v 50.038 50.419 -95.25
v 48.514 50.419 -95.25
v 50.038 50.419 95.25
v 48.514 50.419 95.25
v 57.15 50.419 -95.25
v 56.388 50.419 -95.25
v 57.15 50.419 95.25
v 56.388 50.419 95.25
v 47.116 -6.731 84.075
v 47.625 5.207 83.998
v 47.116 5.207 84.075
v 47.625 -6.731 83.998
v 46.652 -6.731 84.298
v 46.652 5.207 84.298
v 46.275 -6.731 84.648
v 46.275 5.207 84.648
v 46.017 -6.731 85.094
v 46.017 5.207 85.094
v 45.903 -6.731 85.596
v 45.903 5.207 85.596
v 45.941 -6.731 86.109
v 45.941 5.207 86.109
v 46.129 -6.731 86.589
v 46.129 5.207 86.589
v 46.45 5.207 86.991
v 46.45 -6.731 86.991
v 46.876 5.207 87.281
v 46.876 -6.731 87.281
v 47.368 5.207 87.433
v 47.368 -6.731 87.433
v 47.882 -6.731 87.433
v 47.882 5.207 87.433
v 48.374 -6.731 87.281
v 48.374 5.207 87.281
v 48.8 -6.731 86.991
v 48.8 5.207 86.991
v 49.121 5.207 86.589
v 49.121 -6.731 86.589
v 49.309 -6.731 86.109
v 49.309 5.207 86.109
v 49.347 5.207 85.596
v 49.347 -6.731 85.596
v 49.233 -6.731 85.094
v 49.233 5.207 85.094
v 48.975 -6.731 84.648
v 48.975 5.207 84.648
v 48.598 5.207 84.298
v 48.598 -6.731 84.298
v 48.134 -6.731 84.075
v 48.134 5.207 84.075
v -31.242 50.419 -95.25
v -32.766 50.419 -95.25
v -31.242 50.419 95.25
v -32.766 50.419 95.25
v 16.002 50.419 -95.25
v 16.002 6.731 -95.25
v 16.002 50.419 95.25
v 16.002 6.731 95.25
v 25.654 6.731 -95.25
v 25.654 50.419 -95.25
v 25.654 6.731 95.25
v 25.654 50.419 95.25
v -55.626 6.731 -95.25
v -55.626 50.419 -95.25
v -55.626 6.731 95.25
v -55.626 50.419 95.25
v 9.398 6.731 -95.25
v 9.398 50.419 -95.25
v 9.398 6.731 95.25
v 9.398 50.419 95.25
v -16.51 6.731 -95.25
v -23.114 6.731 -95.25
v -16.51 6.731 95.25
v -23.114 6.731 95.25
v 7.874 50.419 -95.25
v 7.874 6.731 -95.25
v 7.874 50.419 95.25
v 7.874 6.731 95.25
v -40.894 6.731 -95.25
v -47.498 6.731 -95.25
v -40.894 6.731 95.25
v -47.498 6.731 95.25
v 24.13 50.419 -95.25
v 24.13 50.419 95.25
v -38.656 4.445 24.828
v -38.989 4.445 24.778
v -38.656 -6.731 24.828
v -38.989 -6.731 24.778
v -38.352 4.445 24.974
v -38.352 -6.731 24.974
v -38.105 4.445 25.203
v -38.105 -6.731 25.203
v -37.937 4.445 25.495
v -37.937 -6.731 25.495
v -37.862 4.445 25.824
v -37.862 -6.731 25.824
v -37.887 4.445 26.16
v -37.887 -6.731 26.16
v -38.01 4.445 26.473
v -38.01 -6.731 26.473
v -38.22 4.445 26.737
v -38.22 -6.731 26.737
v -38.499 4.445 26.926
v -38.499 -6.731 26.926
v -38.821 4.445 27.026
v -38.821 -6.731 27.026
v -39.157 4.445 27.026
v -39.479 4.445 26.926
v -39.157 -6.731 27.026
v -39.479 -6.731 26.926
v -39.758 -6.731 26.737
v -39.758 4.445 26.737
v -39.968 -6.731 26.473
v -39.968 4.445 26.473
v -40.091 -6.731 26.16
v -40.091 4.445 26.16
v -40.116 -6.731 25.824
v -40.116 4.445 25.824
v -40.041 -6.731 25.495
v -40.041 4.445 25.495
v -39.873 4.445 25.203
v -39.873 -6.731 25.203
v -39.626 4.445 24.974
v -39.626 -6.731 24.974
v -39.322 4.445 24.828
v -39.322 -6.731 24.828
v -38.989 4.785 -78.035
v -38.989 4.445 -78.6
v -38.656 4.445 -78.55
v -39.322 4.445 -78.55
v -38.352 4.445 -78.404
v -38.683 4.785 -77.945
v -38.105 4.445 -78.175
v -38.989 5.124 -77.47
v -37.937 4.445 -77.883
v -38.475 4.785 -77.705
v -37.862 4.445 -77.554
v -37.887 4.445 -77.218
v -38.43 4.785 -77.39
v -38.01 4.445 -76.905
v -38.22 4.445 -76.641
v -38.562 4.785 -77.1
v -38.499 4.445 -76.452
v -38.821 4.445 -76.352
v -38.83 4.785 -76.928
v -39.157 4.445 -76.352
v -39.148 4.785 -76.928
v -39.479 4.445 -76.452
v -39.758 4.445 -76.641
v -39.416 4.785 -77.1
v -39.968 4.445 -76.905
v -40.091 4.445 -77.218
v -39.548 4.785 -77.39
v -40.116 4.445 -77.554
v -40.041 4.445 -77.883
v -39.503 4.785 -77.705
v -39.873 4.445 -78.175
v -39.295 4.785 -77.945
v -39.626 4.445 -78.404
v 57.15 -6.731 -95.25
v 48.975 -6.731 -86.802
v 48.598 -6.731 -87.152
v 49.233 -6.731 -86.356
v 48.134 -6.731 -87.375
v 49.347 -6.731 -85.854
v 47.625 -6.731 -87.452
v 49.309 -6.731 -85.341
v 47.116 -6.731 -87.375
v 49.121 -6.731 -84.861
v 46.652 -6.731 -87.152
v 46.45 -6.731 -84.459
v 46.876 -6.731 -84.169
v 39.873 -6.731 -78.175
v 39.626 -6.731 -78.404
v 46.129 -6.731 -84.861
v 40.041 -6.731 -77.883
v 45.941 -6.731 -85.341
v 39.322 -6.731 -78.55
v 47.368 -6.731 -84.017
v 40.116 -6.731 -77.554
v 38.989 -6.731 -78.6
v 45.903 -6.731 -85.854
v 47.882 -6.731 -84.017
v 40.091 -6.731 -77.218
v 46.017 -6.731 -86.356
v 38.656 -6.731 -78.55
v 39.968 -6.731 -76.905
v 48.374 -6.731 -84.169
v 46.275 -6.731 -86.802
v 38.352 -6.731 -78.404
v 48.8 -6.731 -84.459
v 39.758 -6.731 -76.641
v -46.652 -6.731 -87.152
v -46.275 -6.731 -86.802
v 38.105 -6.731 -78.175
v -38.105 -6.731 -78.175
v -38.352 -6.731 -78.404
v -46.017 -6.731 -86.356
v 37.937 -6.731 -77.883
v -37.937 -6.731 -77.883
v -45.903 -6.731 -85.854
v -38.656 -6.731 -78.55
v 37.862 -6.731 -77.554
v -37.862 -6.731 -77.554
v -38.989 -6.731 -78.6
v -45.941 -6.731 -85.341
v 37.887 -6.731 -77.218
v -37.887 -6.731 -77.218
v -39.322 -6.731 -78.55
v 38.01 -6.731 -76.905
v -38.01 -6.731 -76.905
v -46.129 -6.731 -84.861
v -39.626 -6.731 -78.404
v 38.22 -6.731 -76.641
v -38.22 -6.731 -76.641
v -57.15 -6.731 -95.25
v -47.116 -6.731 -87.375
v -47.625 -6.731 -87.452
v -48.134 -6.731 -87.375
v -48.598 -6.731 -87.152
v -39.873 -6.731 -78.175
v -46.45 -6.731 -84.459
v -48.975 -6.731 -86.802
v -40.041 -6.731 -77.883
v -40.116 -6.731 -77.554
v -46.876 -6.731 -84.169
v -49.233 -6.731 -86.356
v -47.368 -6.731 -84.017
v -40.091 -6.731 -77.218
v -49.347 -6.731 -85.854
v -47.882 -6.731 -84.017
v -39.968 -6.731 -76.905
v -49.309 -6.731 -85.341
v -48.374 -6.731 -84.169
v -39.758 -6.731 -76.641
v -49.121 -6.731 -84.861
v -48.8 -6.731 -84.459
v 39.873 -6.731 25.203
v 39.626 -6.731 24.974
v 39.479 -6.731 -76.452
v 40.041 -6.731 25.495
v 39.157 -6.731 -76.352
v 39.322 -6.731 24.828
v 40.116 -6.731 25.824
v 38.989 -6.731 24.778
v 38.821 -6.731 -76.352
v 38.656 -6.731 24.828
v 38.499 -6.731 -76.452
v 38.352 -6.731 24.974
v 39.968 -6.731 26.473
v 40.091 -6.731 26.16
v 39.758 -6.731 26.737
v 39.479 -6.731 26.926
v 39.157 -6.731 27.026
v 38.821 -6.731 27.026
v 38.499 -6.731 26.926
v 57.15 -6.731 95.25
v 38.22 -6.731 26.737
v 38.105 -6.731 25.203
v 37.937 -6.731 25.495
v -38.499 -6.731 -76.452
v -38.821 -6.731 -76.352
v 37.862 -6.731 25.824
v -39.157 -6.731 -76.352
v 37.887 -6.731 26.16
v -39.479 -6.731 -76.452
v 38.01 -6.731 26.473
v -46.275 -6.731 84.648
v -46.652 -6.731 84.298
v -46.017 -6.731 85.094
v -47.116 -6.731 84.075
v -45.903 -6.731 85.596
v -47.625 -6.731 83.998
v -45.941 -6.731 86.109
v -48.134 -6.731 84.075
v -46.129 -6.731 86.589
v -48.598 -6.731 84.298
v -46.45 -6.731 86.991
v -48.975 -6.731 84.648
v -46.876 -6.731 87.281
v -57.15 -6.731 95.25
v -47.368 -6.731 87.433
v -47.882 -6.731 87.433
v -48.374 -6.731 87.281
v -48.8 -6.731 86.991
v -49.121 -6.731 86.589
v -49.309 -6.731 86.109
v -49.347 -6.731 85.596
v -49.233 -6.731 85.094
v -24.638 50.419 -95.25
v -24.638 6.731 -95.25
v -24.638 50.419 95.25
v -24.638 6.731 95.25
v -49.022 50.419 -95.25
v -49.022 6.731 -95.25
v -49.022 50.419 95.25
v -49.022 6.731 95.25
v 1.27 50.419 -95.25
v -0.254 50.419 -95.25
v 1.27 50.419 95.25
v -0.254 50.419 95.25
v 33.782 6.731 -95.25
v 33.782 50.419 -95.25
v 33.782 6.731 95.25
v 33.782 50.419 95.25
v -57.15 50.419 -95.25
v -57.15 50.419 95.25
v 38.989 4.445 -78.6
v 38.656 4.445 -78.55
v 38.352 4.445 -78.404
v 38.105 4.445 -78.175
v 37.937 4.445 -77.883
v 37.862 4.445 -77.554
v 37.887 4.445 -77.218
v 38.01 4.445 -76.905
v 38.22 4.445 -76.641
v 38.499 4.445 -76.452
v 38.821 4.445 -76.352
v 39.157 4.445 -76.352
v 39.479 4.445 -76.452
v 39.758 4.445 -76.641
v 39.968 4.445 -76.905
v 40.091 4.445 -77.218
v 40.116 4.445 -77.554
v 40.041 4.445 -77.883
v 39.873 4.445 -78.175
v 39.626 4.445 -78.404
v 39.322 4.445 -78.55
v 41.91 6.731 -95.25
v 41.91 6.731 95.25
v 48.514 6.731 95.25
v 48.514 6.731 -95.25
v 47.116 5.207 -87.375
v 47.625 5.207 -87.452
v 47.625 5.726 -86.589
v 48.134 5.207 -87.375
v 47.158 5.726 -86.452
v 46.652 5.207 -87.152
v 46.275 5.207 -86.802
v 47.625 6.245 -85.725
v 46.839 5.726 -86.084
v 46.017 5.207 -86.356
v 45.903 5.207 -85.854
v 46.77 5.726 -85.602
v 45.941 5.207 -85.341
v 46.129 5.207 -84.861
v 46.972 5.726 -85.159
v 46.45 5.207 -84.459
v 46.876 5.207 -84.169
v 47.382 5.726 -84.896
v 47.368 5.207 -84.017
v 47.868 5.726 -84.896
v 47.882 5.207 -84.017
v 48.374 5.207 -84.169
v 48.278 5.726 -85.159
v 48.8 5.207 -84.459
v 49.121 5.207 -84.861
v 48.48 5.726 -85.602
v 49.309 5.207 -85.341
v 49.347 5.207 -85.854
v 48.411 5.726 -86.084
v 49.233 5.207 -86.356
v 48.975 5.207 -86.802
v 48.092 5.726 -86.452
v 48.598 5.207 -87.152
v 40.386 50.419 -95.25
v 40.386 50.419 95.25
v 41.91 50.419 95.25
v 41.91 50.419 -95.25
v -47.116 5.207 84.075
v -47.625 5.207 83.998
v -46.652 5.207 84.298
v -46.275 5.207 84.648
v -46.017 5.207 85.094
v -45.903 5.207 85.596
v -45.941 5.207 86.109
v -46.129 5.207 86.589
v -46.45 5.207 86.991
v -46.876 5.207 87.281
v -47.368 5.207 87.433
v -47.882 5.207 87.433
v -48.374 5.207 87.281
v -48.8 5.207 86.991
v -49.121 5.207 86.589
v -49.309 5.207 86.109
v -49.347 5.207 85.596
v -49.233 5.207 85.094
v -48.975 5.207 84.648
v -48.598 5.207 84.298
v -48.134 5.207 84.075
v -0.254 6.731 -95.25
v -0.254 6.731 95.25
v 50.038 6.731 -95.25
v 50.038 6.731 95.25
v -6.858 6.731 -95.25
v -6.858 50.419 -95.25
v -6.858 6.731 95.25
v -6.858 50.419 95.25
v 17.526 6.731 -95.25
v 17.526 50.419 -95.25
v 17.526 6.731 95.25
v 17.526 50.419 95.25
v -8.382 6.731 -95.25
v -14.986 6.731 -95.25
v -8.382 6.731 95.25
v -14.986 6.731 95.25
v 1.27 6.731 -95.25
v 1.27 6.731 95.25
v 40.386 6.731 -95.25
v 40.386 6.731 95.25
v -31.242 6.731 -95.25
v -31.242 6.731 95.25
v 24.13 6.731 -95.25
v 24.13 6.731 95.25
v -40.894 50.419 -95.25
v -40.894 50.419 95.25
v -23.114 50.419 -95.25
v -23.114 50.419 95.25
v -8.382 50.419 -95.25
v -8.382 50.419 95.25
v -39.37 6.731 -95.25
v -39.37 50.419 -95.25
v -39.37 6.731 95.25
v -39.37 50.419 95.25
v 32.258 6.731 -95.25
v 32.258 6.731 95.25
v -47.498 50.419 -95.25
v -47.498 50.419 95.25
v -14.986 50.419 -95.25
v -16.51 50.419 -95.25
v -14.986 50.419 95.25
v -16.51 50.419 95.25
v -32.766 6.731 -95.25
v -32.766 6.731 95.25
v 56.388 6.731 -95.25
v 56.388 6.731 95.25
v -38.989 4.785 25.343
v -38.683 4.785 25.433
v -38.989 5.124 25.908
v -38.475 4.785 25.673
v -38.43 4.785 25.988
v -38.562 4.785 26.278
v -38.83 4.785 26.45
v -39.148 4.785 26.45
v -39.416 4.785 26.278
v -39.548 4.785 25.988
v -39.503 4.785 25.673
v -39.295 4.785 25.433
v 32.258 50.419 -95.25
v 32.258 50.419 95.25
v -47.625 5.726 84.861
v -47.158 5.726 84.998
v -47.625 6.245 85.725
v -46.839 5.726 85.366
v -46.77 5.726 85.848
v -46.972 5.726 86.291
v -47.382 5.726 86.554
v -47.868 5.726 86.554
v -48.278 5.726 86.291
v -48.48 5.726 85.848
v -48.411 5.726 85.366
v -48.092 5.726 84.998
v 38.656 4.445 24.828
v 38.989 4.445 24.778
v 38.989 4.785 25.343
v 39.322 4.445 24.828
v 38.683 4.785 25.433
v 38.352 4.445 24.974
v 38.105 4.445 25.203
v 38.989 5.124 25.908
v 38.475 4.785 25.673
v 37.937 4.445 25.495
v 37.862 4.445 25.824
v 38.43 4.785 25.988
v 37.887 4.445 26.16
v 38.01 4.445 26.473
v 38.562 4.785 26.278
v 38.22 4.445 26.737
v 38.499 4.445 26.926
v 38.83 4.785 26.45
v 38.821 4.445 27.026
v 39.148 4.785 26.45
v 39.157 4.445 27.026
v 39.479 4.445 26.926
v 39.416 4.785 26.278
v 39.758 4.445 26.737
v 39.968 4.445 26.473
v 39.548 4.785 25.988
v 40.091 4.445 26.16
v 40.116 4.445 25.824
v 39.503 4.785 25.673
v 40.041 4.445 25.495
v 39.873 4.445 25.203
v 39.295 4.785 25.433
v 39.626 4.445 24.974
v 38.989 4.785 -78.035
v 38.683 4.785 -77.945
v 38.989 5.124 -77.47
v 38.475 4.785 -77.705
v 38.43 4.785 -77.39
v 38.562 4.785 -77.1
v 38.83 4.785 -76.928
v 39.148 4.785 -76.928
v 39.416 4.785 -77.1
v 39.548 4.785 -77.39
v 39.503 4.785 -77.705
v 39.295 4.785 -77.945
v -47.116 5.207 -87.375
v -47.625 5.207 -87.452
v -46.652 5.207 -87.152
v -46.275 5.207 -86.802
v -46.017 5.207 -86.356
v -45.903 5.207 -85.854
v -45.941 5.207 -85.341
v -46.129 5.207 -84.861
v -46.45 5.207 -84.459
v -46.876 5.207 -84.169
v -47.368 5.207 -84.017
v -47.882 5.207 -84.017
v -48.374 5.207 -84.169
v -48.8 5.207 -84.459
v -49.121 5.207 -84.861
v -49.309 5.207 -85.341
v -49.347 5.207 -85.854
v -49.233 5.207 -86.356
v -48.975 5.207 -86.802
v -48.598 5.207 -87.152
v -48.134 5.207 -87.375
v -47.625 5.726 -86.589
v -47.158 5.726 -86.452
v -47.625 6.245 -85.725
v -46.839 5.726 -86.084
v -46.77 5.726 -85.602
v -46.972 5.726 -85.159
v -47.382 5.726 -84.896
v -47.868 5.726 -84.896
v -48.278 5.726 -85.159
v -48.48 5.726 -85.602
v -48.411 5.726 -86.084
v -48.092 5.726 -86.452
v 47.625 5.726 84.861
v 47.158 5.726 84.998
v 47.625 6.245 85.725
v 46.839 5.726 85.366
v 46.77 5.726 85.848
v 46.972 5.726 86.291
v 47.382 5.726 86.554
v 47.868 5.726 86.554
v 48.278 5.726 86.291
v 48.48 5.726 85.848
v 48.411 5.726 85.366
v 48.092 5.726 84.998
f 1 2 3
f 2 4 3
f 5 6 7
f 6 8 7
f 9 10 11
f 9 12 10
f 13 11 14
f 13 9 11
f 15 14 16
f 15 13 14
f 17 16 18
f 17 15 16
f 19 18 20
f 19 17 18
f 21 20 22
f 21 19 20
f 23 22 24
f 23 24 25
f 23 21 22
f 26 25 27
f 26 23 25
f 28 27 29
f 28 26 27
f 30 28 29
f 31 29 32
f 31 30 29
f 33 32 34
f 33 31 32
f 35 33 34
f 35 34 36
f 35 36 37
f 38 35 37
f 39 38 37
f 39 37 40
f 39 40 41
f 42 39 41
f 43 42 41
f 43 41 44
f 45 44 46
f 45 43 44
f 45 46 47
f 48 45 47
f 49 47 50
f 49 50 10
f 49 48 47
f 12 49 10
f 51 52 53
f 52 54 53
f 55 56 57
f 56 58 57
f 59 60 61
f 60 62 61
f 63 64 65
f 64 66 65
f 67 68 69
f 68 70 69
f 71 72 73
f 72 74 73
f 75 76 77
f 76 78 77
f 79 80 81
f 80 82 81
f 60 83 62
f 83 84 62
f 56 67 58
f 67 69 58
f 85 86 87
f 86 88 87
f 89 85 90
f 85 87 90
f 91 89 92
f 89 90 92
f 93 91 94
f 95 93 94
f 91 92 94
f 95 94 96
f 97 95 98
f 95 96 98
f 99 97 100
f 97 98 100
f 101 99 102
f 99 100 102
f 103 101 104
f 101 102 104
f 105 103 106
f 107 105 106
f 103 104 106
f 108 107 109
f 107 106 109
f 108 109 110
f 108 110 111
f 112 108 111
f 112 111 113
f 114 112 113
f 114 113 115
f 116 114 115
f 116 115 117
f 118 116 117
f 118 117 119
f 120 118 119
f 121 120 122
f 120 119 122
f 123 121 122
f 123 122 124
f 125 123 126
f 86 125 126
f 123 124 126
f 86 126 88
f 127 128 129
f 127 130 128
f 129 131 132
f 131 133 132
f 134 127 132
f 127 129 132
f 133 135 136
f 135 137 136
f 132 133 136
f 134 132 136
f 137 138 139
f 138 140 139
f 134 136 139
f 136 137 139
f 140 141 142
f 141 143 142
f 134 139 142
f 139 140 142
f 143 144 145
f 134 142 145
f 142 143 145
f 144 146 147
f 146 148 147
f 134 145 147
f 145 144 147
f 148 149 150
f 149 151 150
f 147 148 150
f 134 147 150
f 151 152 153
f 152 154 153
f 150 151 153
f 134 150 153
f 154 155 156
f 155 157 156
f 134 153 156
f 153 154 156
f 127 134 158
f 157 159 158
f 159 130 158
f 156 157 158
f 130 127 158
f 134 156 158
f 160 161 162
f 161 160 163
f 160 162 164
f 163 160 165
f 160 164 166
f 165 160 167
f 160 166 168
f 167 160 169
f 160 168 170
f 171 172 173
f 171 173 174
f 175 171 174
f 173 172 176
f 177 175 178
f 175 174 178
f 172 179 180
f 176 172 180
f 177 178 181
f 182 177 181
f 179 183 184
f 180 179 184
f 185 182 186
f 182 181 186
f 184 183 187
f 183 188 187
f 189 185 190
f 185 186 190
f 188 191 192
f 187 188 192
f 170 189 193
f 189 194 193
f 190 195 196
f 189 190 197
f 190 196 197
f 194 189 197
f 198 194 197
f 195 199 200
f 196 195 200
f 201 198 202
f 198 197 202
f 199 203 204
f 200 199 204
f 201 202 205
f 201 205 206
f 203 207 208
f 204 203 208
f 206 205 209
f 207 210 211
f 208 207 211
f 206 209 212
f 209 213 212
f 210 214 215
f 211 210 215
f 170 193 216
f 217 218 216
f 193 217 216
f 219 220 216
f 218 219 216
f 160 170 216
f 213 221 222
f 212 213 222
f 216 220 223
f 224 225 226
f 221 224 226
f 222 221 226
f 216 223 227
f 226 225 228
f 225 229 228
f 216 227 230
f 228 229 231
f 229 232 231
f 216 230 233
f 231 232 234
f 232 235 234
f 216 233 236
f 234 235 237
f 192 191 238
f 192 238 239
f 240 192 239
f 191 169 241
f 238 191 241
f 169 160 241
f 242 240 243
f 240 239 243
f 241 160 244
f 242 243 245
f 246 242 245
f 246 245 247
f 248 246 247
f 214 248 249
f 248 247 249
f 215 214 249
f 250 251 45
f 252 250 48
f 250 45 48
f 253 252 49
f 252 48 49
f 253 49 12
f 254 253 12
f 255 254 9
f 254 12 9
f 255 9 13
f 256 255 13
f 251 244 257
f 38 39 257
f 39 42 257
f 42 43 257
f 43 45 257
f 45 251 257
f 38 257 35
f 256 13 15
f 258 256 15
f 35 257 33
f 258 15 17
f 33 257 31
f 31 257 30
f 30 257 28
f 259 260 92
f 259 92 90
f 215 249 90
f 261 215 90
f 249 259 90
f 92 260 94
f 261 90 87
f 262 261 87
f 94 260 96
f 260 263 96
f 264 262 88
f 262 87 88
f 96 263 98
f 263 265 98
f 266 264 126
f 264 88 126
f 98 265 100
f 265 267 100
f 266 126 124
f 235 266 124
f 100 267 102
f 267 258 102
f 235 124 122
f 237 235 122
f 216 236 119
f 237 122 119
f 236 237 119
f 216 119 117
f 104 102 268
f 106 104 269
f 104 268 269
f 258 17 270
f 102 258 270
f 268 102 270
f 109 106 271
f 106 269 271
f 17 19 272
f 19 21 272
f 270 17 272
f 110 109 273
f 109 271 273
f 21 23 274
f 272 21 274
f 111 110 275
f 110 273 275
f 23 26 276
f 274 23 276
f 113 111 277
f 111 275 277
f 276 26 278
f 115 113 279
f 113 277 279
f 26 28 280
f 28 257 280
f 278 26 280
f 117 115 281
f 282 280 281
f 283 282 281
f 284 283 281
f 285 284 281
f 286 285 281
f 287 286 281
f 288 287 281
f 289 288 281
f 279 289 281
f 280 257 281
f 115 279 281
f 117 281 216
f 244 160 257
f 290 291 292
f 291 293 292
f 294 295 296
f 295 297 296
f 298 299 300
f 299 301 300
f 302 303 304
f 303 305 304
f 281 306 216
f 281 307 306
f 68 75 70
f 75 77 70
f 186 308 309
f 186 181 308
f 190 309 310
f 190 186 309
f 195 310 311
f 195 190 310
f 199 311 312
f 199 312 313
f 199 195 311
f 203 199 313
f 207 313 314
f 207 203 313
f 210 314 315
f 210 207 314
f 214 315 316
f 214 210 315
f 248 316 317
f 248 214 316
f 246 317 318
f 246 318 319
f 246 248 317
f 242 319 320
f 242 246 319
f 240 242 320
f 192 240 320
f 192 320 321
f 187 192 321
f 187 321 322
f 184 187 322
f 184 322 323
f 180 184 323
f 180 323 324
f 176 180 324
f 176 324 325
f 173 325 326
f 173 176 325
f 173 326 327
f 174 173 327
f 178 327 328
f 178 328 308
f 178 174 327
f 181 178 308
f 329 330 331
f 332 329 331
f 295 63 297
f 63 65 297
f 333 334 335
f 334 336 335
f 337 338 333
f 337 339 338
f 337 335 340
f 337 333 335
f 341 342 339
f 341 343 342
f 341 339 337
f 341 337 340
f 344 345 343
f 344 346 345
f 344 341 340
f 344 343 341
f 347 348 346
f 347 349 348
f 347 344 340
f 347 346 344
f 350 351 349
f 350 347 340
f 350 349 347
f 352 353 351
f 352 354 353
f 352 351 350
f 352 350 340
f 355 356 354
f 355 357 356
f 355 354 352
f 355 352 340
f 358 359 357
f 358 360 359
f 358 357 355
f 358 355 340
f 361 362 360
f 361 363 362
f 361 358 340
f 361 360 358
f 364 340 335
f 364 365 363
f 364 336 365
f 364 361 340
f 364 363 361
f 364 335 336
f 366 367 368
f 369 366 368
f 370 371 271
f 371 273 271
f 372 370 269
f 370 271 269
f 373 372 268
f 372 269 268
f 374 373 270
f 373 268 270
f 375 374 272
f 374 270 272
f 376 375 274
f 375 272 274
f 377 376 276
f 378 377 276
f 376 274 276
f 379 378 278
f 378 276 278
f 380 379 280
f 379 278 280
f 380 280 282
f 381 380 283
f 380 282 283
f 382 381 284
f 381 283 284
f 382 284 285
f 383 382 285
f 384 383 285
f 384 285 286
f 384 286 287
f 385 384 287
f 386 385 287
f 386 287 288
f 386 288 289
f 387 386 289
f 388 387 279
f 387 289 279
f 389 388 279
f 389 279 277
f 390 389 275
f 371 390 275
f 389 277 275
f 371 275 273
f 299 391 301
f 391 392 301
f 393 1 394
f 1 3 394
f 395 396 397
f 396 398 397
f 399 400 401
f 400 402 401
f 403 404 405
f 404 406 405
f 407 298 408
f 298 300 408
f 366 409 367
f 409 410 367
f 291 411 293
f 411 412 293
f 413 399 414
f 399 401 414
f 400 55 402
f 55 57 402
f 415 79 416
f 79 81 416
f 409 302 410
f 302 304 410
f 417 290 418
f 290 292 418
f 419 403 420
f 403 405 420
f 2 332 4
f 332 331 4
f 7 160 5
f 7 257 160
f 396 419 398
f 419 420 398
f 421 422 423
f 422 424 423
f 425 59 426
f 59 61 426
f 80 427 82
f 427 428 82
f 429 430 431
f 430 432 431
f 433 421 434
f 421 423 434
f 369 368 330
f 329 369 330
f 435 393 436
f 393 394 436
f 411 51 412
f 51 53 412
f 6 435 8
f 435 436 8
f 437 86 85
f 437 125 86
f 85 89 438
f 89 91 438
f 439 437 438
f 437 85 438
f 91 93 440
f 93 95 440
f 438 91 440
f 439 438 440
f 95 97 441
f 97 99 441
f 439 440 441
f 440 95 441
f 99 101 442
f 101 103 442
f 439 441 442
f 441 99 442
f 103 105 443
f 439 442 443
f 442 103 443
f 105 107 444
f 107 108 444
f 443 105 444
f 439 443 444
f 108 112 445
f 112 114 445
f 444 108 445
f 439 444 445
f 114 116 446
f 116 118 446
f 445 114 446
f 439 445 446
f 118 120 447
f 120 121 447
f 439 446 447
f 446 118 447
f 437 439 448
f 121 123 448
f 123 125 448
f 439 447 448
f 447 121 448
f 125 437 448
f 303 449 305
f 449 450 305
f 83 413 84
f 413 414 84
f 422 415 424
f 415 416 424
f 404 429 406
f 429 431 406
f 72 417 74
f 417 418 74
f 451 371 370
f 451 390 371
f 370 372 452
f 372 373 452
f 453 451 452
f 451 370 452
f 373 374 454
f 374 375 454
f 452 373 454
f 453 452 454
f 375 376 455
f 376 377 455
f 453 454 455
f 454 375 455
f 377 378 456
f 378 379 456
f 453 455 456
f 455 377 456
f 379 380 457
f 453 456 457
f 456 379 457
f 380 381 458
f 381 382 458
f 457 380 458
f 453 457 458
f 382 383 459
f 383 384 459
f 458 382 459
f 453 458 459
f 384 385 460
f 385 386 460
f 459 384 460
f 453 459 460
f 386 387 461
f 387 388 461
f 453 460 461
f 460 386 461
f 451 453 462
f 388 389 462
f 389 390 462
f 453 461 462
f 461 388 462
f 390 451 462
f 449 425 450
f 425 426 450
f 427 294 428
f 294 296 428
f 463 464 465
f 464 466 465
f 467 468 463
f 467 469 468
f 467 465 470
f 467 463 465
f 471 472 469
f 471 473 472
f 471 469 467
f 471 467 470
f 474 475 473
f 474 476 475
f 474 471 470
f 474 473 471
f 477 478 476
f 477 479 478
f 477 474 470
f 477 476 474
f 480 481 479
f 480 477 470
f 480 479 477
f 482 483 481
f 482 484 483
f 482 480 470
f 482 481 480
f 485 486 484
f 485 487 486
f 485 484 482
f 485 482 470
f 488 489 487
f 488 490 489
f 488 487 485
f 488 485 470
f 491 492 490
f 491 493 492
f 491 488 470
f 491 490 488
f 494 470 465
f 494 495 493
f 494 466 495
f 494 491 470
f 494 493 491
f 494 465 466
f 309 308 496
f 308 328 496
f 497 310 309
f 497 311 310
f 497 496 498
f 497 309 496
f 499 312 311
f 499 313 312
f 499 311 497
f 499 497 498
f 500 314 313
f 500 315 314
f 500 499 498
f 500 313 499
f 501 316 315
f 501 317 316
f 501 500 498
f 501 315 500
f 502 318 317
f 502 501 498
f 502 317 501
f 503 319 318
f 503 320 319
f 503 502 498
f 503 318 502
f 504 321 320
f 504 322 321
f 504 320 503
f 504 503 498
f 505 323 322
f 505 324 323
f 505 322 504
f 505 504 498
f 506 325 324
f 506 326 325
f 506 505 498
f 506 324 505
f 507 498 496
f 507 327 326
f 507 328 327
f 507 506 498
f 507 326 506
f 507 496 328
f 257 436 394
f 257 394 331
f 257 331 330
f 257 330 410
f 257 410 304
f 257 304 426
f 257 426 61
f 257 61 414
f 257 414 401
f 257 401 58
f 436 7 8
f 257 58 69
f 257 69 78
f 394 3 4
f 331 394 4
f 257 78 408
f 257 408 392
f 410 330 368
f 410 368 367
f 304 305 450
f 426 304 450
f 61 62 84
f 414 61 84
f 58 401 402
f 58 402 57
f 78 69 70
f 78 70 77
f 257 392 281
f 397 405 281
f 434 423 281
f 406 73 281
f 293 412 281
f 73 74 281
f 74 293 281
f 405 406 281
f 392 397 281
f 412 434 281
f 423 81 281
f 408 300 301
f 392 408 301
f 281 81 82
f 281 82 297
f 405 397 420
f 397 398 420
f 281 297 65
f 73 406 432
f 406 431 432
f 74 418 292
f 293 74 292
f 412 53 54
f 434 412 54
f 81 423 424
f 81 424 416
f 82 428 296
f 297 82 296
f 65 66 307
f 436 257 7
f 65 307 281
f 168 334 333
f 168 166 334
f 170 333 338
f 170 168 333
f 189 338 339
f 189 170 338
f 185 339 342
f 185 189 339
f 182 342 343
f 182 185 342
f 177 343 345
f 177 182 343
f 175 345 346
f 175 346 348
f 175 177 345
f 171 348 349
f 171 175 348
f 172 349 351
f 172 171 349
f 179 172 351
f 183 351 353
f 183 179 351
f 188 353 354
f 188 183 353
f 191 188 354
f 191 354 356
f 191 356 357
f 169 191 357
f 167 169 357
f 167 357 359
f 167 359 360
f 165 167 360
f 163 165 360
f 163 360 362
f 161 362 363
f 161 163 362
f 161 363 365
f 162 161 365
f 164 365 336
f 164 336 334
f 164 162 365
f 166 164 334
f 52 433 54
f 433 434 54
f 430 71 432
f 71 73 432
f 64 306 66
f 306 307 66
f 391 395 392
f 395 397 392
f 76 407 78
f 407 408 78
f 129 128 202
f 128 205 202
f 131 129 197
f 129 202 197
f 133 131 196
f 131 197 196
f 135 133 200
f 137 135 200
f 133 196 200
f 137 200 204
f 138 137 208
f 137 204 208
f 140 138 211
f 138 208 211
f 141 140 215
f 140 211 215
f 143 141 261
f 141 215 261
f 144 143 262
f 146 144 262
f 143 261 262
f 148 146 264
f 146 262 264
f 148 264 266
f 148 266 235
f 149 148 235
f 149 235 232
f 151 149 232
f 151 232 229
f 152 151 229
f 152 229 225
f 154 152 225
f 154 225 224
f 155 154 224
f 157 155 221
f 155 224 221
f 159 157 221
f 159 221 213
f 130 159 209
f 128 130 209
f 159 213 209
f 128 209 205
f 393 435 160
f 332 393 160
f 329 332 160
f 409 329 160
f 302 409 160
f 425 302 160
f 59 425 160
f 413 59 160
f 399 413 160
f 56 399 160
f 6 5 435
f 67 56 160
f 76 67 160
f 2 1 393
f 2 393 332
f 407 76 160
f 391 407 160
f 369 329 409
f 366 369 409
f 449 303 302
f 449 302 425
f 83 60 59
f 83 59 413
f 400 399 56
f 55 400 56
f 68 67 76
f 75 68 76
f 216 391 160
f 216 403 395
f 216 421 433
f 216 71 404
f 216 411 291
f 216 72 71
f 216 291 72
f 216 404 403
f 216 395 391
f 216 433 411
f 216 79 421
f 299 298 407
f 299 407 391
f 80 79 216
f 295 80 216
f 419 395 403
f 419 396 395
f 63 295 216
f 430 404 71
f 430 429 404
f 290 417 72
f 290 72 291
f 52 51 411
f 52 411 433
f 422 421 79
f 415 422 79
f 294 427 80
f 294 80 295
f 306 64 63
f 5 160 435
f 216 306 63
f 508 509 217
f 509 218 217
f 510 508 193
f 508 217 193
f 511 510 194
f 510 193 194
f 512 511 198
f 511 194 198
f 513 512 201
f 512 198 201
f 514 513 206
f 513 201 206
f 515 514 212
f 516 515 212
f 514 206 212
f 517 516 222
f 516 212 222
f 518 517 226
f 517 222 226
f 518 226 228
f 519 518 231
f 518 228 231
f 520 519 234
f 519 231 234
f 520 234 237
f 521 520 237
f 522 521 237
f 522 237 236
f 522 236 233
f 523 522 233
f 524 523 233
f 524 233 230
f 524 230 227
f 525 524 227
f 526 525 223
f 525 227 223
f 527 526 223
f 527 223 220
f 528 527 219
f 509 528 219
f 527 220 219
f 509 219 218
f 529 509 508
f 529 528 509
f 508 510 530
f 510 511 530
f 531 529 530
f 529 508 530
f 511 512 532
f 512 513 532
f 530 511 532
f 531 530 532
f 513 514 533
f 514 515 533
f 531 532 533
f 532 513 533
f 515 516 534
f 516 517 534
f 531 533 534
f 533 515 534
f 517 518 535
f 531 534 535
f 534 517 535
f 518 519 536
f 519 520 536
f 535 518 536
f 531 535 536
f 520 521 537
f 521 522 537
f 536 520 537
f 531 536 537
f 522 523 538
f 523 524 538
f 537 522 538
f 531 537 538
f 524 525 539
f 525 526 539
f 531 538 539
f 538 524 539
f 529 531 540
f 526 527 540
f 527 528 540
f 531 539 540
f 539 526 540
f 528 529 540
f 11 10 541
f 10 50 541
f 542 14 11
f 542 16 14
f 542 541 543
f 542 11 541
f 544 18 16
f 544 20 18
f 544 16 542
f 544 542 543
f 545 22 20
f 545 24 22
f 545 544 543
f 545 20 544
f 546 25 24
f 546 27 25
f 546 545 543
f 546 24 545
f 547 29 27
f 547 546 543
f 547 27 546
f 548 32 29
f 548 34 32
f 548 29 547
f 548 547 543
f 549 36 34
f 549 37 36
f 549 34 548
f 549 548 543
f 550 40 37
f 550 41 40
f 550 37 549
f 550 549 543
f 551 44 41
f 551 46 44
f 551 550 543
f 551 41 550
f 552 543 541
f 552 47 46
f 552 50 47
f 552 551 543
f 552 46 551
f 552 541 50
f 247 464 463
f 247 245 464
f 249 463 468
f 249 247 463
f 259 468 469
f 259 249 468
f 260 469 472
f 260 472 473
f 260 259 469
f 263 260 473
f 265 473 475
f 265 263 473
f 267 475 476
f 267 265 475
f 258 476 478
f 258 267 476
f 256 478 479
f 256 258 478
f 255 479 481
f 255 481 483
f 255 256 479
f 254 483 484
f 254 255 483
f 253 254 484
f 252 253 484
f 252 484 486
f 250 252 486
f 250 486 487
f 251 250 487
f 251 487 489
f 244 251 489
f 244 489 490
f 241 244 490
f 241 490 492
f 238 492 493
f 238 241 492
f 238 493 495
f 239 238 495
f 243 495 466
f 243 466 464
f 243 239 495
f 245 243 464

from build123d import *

# Parameters (mm, degrees)
BOSS_EXTRUDE1_DEPTH = 95.25
LPATTERN1_COUNT     = 2
LPATTERN1_PITCH     = 171.45
LPATTERN2_COUNT     = 2
LPATTERN2_PITCH     = 103.378


with BuildPart() as part:
    # Sketch1 → Boss-Extrude1 (new, symmetric)
    with BuildSketch(Plane.XY):
        Polygon((41.91, 6.731), (48.514, 6.731), (48.514, 50.419), (50.038, 50.419), (50.038, 6.731), (56.388, 6.731), (56.388, 50.419), (57.15, 50.419), (57.15, 6.731), (57.15, -6.731), (-57.15, -6.731), (-57.15, 6.731), (-57.15, 50.419), (-55.626, 50.419), (-55.626, 6.731), (-49.022, 6.731), (-49.022, 50.419), (-47.498, 50.419), (-47.498, 6.731), (-40.894, 6.731), (-40.894, 50.419), (-39.37, 50.419), (-39.37, 6.731), (-32.766, 6.731), (-32.766, 50.419), (-31.242, 50.419), (-31.242, 6.731), (-24.638, 6.731), (-24.638, 50.419), (-23.114, 50.419), (-23.114, 6.731), (-16.51, 6.731), (-16.51, 50.419), (-14.986, 50.419), (-14.986, 6.731), (-8.382, 6.731), (-8.382, 50.419), (-6.858, 50.419), (-6.858, 6.731), (-0.254, 6.731), (-0.254, 50.419), (1.27, 50.419), (1.27, 6.731), (7.874, 6.731), (7.874, 50.419), (9.398, 50.419), (9.398, 6.731), (16.002, 6.731), (16.002, 50.419), (17.526, 50.419), (17.526, 6.731), (24.13, 6.731), (24.13, 50.419), (25.654, 50.419), (25.654, 6.731), (32.258, 6.731), (32.258, 50.419), (33.782, 50.419), (33.782, 6.731), (40.386, 6.731), (40.386, 50.419), (41.91, 50.419), align=None)
    extrude(amount=BOSS_EXTRUDE1_DEPTH, both=True)

    # Sketch3 → #8-32 Tapped Hole1 (revolve, cut)
    with BuildSketch(Plane(origin=(47.625, -6.731, 85.725), x_dir=(0, 0, -1), z_dir=(1, 0, 0))):
        Polygon((0, 0), (0, 12.975806461), (1.7272, 11.938), (1.7272, 0), align=None)
    f_8_32_tapped_hole1 = revolve(axis=Axis((47.625, -13.081, 85.725), (0, 1, 0)), mode=Mode.SUBTRACT)

    # Sketch5 → #4-40 Tapped Hole1 (revolve, cut)
    with BuildSketch(Plane(origin=(38.989, -6.731, 25.908), x_dir=(0, 0, -1), z_dir=(1, 0, 0))):
        Polygon((0, 0), (0, 11.855152758), (1.1303, 11.176), (1.1303, 0), align=None)
    f_4_40_tapped_hole1 = revolve(axis=Axis((38.989, -13.081, 25.908), (0, 1, 0)), mode=Mode.SUBTRACT)

    # LPattern1: #8-32 Tapped Hole1 ×2
    with Locations(*[(0, 0, -i * LPATTERN1_PITCH) for i in range(1, LPATTERN1_COUNT)]):
        add(f_8_32_tapped_hole1, mode=Mode.SUBTRACT)

    # LPattern2: #4-40 Tapped Hole1 ×2
    with Locations(*[(0, 0, -i * LPATTERN2_PITCH) for i in range(1, LPATTERN2_COUNT)]):
        add(f_4_40_tapped_hole1, mode=Mode.SUBTRACT)

    # Mirror1: #8-32 Tapped Hole1, #4-40 Tapped Hole1 across plane
    add(f_8_32_tapped_hole1.mirror(Plane(origin=(0, 0, 0), x_dir=(0, 0, 1), z_dir=(1, 0, 0))), mode=Mode.SUBTRACT)
    add(f_4_40_tapped_hole1.mirror(Plane(origin=(0, 0, 0), x_dir=(0, 0, 1), z_dir=(1, 0, 0))), mode=Mode.SUBTRACT)

    # Mirror1 copy 1 sketch → Mirror1 copy 1 (revolve, cut)
    with BuildSketch(Plane(origin=(-47.625, -6.731, -85.725), x_dir=(0, 0, -1), z_dir=(-1, 0, 0))):
        Polygon((0, 0), (0, -12.975806461), (1.7272, -11.938), (1.7272, 0), align=None)
    revolve(axis=Axis((-47.625, -13.081, -85.725), (0, -1, 0)), mode=Mode.SUBTRACT)

    # Mirror1 copy 2 sketch → Mirror1 copy 2 (revolve, cut)
    with BuildSketch(Plane(origin=(-38.989, -6.731, -77.47), x_dir=(0, 0, -1), z_dir=(-1, 0, 0))):
        Polygon((0, 0), (0, -11.855152758), (1.1303, -11.176), (1.1303, 0), align=None)
    revolve(axis=Axis((-38.989, -13.081, -77.47), (0, -1, 0)), mode=Mode.SUBTRACT)


solid = part.part
